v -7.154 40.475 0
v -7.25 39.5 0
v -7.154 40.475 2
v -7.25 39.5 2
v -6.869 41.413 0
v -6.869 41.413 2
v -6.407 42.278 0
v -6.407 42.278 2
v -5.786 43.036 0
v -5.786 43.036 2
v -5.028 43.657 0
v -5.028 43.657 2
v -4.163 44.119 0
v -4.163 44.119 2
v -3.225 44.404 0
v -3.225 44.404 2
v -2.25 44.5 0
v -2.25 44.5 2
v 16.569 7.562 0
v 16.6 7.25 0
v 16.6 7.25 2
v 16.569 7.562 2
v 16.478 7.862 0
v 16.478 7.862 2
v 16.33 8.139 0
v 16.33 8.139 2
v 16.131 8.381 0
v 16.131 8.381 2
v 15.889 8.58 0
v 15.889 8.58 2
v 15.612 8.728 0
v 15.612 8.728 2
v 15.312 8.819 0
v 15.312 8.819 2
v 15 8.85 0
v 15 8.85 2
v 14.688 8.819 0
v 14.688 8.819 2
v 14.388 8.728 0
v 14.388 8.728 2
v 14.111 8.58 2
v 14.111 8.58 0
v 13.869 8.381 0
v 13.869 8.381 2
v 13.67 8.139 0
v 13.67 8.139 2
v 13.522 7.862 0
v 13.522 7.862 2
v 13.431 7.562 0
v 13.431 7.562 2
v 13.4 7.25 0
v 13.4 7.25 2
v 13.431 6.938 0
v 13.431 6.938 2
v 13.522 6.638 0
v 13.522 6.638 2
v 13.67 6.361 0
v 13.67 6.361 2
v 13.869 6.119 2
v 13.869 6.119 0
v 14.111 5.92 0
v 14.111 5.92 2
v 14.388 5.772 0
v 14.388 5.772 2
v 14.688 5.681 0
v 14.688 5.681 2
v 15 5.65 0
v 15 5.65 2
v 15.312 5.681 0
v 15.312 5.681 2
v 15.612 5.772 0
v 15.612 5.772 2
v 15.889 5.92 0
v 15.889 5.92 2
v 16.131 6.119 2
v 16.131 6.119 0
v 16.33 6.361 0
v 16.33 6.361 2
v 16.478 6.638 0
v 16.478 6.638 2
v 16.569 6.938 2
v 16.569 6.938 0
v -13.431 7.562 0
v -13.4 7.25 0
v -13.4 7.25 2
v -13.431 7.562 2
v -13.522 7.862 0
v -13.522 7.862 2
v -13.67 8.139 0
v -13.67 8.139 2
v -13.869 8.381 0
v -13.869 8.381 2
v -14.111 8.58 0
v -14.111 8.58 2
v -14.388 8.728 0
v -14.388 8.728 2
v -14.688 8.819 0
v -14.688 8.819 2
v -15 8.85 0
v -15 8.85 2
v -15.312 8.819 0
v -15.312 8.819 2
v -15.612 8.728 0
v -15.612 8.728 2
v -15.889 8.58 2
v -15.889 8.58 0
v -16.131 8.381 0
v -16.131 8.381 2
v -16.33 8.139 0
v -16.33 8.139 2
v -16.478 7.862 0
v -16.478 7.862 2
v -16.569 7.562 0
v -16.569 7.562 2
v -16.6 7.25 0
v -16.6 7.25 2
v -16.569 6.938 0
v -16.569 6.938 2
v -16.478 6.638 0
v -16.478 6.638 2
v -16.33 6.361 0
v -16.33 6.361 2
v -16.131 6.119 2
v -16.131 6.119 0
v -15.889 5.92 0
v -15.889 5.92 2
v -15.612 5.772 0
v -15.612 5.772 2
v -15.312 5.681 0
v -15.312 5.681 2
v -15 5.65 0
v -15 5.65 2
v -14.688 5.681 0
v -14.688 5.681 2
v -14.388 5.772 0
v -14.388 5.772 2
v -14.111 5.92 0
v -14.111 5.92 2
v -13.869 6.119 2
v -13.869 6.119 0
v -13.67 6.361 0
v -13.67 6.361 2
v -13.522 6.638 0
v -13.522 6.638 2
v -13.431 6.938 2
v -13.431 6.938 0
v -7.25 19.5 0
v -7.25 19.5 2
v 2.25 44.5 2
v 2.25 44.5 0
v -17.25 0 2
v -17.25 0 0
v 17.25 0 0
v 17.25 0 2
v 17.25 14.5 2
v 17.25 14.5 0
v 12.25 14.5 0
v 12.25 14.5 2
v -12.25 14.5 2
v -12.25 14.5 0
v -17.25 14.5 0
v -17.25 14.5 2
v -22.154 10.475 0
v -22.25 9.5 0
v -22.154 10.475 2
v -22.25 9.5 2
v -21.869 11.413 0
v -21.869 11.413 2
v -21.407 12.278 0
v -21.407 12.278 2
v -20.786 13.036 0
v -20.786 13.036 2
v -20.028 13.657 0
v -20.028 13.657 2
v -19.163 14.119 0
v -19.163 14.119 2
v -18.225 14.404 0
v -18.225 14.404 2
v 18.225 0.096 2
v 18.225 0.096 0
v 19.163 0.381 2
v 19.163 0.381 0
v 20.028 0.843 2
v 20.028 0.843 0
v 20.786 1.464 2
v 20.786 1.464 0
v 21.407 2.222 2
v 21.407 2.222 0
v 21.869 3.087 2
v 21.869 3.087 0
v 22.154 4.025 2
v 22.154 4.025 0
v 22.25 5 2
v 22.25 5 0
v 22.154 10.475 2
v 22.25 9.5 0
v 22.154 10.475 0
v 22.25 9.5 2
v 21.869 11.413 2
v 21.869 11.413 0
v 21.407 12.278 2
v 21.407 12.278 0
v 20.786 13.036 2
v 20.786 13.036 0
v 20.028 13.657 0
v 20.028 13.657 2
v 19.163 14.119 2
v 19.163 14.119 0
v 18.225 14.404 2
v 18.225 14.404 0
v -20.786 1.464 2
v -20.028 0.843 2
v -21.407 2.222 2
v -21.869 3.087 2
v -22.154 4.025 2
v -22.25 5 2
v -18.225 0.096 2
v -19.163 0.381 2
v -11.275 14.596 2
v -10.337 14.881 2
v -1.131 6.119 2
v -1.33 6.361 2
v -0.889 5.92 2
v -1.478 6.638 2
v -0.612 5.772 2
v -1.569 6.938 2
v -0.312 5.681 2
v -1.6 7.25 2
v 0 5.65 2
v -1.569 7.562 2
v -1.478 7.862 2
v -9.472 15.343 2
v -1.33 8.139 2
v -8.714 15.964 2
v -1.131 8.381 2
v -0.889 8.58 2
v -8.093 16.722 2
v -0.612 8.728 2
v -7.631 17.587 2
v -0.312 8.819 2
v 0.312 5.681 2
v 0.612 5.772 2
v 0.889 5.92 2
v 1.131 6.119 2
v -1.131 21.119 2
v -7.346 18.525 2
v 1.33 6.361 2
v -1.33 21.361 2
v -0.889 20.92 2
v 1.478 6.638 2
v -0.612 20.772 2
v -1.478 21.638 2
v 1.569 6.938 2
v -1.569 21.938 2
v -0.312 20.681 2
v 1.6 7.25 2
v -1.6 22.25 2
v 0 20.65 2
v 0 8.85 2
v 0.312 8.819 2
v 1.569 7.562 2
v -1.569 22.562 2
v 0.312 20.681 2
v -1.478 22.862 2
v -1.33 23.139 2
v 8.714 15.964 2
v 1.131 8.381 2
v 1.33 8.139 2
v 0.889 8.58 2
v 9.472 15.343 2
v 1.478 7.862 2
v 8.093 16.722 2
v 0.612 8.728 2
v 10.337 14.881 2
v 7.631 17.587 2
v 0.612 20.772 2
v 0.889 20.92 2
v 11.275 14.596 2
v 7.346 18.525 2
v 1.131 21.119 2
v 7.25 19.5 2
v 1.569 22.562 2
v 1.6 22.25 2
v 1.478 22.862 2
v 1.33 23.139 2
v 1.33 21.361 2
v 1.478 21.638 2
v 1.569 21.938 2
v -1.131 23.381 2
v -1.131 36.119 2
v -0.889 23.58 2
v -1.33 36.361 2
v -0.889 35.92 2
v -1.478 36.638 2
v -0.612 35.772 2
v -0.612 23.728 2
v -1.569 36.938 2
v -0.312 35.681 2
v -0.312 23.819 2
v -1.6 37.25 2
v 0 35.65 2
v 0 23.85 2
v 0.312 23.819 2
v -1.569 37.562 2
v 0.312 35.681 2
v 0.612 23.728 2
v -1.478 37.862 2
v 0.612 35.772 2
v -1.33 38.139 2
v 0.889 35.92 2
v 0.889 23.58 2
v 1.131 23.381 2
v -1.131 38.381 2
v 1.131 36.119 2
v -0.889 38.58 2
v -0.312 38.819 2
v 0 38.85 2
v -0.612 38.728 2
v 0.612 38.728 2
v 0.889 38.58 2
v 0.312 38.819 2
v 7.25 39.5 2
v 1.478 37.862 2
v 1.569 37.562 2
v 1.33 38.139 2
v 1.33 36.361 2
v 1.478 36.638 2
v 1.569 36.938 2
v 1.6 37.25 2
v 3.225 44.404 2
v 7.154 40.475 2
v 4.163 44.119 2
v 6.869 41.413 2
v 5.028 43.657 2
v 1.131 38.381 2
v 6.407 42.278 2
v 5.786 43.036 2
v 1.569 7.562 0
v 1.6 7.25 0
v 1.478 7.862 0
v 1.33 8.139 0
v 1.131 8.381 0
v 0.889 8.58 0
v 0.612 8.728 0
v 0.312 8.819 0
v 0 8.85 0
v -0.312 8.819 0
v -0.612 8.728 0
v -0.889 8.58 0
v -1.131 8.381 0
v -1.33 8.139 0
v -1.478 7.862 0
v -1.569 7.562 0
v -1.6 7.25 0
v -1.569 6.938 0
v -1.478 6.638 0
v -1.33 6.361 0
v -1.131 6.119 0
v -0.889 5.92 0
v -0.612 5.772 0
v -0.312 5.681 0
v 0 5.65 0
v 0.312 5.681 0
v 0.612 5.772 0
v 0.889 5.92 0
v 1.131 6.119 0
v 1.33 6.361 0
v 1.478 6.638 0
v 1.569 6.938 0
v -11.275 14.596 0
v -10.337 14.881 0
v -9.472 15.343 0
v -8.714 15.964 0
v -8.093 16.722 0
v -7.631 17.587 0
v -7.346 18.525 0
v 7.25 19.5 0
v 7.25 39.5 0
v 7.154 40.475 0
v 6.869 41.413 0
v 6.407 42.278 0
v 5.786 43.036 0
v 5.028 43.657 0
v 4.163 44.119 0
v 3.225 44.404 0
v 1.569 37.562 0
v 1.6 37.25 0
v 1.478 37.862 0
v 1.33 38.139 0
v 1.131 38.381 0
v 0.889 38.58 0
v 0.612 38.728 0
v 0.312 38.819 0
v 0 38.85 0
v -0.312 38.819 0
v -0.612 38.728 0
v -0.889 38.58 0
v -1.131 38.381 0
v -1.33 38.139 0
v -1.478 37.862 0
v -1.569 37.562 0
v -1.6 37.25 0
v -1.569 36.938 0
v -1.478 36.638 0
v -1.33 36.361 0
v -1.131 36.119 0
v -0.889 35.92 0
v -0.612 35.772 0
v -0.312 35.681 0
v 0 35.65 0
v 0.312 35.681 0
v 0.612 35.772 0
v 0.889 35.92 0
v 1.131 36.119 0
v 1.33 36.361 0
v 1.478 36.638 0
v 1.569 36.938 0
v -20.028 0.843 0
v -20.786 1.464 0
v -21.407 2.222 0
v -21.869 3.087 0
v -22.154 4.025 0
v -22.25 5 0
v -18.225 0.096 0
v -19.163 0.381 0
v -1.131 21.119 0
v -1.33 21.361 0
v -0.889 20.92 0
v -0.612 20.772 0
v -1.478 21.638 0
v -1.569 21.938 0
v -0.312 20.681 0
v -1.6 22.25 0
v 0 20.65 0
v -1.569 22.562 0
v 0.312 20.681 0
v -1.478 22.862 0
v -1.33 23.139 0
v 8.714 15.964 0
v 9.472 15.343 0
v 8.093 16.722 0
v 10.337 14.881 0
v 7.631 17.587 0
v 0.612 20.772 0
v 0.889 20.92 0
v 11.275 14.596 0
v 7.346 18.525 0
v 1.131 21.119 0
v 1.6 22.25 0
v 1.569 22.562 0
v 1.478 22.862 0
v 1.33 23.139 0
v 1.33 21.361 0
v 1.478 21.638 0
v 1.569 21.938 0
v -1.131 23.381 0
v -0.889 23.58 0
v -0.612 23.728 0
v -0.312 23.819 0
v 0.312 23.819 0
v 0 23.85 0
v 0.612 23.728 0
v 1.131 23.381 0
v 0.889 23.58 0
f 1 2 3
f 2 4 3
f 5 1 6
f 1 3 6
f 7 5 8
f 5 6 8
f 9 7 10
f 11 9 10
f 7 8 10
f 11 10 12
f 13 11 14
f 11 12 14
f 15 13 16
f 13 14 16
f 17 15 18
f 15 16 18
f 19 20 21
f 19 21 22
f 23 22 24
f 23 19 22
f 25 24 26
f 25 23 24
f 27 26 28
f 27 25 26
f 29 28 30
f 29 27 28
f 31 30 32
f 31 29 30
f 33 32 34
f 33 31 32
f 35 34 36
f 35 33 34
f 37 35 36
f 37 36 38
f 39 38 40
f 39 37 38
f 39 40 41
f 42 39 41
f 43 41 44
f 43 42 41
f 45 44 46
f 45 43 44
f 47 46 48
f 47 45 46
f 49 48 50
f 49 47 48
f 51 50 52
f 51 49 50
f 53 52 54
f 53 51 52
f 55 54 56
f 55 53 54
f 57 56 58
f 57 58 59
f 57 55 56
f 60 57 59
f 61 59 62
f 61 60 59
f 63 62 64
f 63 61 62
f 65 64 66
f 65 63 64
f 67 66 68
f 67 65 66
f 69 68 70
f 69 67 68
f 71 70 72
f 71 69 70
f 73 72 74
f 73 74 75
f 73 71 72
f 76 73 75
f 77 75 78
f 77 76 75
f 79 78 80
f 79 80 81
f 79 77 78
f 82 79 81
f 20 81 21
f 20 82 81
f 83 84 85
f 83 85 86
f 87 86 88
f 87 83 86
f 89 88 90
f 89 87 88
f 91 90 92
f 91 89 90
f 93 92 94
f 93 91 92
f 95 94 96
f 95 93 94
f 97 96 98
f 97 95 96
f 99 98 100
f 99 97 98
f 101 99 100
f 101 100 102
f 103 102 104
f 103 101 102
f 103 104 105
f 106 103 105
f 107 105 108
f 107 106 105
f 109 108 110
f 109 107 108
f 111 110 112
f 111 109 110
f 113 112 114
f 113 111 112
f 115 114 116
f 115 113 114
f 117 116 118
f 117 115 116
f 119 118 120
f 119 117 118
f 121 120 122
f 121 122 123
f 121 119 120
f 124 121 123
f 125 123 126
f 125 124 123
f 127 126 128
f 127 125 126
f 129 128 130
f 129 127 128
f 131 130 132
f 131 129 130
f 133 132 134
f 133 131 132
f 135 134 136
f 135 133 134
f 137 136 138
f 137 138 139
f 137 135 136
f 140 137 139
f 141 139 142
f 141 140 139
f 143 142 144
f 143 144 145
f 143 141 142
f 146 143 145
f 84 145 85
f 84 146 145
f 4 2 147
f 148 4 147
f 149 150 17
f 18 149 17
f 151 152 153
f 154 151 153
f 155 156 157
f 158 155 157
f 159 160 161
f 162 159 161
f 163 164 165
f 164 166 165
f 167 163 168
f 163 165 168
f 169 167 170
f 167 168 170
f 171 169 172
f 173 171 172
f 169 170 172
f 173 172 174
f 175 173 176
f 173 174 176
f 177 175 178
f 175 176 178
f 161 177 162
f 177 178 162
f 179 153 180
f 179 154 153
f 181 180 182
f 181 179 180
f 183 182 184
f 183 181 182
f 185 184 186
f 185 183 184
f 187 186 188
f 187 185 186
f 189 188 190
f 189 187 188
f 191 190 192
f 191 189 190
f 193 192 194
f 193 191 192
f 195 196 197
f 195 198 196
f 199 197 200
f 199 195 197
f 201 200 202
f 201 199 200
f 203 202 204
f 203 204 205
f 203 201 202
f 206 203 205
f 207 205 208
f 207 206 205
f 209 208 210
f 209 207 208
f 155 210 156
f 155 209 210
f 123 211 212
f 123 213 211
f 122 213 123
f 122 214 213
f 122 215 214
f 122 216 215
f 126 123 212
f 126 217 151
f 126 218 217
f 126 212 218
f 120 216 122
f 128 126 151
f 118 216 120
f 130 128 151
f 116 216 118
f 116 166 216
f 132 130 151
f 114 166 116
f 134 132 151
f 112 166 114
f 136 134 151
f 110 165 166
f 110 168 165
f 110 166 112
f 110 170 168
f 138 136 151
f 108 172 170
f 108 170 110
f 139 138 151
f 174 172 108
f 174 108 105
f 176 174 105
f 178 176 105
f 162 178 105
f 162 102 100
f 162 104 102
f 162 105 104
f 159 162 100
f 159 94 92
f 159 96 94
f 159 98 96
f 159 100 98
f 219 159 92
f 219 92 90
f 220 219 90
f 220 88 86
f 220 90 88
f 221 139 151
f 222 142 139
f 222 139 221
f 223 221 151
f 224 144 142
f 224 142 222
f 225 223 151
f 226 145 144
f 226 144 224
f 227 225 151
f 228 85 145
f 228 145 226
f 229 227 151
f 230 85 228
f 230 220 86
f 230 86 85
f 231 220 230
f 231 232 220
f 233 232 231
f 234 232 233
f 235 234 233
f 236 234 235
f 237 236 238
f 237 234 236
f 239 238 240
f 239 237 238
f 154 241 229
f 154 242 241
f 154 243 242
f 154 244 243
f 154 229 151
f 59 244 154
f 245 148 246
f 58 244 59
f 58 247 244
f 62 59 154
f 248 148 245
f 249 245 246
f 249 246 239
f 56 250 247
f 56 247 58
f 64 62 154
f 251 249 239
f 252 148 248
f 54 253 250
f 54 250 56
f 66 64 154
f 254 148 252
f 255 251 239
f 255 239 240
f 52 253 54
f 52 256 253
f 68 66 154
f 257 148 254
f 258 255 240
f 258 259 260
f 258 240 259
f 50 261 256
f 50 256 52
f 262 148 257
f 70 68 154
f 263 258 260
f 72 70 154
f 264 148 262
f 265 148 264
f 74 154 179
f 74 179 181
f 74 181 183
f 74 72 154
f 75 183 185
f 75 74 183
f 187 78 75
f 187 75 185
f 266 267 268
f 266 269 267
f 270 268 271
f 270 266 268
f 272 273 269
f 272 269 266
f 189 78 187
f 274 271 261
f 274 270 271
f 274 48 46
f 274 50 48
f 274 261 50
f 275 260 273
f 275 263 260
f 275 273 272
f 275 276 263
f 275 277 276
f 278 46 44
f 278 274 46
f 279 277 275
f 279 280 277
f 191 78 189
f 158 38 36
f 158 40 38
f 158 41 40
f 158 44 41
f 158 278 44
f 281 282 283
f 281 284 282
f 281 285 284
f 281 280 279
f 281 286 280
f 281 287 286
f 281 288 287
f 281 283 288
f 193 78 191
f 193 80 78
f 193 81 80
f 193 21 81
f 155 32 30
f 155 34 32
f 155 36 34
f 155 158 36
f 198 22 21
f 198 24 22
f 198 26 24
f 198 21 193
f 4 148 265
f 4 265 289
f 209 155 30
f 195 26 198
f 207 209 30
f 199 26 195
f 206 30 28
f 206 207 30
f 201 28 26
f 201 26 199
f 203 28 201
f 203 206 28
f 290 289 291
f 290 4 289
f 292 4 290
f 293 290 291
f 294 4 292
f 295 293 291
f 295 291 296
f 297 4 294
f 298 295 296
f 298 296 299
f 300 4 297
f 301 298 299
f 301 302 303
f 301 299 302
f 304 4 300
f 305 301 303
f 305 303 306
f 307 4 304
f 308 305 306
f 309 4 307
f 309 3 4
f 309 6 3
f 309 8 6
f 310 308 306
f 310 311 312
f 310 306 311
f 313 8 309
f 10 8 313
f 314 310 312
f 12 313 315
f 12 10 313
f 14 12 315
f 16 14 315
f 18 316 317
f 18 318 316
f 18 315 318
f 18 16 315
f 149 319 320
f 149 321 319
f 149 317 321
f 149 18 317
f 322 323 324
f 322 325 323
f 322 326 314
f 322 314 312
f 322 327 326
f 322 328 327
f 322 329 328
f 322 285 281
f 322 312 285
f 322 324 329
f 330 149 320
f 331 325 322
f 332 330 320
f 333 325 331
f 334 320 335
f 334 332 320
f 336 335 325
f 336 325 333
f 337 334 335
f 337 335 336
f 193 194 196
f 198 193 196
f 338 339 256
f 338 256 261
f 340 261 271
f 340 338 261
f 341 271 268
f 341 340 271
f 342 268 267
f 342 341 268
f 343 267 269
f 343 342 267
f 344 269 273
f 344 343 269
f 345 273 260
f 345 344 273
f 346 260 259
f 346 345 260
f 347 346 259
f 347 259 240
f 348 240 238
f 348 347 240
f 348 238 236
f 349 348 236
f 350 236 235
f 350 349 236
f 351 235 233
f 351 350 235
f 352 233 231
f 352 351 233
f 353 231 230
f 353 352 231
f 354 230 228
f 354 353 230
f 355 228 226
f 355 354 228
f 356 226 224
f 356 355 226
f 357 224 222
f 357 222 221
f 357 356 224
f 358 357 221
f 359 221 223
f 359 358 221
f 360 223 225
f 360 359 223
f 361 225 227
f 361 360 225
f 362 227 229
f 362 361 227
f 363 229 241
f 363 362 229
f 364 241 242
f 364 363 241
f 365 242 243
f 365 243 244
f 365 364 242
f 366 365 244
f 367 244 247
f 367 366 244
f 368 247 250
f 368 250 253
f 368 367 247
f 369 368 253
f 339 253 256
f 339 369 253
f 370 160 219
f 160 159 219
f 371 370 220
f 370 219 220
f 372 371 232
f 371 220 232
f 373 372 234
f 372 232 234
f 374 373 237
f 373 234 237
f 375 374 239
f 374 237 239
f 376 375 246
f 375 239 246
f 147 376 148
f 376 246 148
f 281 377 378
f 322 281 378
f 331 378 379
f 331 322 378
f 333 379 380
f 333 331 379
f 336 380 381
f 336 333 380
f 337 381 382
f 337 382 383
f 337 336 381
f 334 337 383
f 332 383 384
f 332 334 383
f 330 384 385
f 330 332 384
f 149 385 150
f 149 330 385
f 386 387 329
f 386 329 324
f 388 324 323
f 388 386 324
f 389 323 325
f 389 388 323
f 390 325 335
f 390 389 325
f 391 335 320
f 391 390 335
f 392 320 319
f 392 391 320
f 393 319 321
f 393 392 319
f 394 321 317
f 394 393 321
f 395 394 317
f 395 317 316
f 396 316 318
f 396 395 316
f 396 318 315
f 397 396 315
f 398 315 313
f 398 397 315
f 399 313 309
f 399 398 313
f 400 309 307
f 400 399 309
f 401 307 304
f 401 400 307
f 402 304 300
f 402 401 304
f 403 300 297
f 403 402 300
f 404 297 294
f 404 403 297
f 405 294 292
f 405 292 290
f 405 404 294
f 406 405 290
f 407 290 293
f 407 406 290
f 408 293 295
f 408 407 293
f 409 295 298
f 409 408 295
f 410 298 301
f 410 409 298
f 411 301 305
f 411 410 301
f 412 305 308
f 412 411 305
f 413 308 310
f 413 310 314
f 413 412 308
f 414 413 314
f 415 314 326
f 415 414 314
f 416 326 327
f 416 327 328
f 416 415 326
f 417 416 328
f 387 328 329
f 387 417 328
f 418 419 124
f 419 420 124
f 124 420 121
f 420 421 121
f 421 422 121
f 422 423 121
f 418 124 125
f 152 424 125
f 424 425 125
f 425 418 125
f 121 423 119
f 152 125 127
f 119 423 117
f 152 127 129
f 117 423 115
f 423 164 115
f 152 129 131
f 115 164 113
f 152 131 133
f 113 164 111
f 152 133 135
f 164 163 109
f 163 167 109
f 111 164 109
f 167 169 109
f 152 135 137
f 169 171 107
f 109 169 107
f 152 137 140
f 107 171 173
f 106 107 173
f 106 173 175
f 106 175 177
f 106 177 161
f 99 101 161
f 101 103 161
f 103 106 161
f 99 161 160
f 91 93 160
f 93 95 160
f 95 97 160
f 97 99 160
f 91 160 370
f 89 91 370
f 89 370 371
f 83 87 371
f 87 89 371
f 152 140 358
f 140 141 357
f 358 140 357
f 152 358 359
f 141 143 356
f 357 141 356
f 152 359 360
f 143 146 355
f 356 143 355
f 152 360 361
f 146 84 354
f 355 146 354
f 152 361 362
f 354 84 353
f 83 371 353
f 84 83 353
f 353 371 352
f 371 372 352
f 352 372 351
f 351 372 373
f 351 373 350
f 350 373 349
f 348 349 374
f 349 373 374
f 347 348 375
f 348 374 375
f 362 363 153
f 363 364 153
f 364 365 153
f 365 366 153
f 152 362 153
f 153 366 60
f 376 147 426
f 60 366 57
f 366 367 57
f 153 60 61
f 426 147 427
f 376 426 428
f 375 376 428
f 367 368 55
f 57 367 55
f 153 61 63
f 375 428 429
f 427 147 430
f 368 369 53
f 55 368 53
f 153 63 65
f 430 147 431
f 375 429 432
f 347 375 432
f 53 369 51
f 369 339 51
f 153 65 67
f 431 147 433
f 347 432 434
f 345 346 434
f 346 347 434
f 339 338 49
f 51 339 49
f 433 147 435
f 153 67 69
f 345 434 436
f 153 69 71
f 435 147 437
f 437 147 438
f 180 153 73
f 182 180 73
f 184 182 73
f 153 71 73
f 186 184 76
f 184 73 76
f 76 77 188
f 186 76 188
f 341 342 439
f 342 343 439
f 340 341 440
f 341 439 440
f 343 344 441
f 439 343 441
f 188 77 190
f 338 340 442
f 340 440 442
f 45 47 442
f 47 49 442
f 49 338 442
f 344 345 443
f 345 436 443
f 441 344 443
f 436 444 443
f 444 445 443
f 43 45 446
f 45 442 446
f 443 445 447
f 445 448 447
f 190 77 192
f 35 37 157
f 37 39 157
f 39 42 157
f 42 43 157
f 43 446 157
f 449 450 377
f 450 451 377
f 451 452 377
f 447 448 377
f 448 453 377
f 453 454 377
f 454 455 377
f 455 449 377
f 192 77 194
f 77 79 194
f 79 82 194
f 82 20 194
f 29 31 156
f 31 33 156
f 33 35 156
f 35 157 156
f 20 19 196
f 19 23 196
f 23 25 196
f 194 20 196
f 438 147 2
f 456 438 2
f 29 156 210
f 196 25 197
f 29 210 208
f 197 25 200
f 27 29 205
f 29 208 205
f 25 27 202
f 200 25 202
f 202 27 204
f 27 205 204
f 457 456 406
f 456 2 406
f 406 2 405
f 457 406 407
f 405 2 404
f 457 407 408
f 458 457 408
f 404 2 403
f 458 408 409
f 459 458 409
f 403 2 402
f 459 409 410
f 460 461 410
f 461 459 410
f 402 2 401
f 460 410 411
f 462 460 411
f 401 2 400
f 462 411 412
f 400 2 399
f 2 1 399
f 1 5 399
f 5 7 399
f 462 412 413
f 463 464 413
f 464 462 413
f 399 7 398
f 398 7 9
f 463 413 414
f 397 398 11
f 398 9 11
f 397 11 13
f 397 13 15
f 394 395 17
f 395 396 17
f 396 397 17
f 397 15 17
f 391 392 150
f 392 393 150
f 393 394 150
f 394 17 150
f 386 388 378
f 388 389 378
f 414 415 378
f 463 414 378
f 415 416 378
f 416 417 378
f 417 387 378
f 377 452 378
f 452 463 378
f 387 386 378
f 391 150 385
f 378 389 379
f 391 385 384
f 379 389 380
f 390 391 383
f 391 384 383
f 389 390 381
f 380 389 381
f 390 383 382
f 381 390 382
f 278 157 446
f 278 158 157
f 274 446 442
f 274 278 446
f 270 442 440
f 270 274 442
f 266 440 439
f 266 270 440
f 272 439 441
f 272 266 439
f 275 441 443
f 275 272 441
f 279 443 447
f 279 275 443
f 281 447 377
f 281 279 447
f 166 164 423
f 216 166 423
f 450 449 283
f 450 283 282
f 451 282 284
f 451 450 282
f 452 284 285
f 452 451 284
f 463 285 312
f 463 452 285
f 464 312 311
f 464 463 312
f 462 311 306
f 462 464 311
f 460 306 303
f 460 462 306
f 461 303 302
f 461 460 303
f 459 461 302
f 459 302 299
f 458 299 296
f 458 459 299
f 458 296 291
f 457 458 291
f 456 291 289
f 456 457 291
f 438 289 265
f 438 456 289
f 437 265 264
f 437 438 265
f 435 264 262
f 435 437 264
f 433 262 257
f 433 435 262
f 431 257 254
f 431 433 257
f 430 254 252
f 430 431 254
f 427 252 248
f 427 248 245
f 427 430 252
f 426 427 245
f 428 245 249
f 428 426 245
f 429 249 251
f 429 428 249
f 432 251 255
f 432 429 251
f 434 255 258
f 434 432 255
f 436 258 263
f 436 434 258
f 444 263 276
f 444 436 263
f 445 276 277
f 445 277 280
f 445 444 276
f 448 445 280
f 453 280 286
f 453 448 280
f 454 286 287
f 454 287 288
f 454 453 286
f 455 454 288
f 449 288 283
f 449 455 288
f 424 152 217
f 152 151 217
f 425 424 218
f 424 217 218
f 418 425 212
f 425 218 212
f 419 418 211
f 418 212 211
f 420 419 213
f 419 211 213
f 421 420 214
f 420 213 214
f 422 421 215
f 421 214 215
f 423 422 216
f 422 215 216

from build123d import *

# Parameters (mm, degrees)
SKETCH1_R           = 1.6
BOSS_EXTRUDE1_DEPTH = 2
FILLET1_R           = 5


with BuildPart() as part:
    # Sketch1 → Boss-Extrude1 (new body)
    with BuildSketch(Plane.XY):
        Polygon((-22.25, 0), (22.25, 0), (22.25, 14.5), (7.25, 14.5), (7.25, 44.5), (-7.25, 44.5), (-7.25, 14.5), (-22.25, 14.5), align=None)
        with Locations((0, 7.25)):
            Circle(SKETCH1_R, mode=Mode.SUBTRACT)
        with Locations((15, 7.25)):
            Circle(SKETCH1_R, mode=Mode.SUBTRACT)
        with Locations((0, 22.25)):
            Circle(SKETCH1_R, mode=Mode.SUBTRACT)
        with Locations((0, 37.25)):
            Circle(SKETCH1_R, mode=Mode.SUBTRACT)
        with Locations((-15, 7.25)):
            Circle(SKETCH1_R, mode=Mode.SUBTRACT)
    extrude(amount=BOSS_EXTRUDE1_DEPTH)

    # Fillet1
    fillet1_edges = [part.edges().sort_by_distance(p)[0] for p in [
        (22.25, 14.5, 1),
        (22.25, 0, 1),
        (-22.25, 0, 1),
        (-22.25, 14.5, 1),
        (-7.25, 14.5, 1),
        (-7.25, 44.5, 1),
        (7.25, 44.5, 1),
        (7.25, 14.5, 1),
    ]]
    fillet(fillet1_edges, radius=FILLET1_R)


solid = part.part
